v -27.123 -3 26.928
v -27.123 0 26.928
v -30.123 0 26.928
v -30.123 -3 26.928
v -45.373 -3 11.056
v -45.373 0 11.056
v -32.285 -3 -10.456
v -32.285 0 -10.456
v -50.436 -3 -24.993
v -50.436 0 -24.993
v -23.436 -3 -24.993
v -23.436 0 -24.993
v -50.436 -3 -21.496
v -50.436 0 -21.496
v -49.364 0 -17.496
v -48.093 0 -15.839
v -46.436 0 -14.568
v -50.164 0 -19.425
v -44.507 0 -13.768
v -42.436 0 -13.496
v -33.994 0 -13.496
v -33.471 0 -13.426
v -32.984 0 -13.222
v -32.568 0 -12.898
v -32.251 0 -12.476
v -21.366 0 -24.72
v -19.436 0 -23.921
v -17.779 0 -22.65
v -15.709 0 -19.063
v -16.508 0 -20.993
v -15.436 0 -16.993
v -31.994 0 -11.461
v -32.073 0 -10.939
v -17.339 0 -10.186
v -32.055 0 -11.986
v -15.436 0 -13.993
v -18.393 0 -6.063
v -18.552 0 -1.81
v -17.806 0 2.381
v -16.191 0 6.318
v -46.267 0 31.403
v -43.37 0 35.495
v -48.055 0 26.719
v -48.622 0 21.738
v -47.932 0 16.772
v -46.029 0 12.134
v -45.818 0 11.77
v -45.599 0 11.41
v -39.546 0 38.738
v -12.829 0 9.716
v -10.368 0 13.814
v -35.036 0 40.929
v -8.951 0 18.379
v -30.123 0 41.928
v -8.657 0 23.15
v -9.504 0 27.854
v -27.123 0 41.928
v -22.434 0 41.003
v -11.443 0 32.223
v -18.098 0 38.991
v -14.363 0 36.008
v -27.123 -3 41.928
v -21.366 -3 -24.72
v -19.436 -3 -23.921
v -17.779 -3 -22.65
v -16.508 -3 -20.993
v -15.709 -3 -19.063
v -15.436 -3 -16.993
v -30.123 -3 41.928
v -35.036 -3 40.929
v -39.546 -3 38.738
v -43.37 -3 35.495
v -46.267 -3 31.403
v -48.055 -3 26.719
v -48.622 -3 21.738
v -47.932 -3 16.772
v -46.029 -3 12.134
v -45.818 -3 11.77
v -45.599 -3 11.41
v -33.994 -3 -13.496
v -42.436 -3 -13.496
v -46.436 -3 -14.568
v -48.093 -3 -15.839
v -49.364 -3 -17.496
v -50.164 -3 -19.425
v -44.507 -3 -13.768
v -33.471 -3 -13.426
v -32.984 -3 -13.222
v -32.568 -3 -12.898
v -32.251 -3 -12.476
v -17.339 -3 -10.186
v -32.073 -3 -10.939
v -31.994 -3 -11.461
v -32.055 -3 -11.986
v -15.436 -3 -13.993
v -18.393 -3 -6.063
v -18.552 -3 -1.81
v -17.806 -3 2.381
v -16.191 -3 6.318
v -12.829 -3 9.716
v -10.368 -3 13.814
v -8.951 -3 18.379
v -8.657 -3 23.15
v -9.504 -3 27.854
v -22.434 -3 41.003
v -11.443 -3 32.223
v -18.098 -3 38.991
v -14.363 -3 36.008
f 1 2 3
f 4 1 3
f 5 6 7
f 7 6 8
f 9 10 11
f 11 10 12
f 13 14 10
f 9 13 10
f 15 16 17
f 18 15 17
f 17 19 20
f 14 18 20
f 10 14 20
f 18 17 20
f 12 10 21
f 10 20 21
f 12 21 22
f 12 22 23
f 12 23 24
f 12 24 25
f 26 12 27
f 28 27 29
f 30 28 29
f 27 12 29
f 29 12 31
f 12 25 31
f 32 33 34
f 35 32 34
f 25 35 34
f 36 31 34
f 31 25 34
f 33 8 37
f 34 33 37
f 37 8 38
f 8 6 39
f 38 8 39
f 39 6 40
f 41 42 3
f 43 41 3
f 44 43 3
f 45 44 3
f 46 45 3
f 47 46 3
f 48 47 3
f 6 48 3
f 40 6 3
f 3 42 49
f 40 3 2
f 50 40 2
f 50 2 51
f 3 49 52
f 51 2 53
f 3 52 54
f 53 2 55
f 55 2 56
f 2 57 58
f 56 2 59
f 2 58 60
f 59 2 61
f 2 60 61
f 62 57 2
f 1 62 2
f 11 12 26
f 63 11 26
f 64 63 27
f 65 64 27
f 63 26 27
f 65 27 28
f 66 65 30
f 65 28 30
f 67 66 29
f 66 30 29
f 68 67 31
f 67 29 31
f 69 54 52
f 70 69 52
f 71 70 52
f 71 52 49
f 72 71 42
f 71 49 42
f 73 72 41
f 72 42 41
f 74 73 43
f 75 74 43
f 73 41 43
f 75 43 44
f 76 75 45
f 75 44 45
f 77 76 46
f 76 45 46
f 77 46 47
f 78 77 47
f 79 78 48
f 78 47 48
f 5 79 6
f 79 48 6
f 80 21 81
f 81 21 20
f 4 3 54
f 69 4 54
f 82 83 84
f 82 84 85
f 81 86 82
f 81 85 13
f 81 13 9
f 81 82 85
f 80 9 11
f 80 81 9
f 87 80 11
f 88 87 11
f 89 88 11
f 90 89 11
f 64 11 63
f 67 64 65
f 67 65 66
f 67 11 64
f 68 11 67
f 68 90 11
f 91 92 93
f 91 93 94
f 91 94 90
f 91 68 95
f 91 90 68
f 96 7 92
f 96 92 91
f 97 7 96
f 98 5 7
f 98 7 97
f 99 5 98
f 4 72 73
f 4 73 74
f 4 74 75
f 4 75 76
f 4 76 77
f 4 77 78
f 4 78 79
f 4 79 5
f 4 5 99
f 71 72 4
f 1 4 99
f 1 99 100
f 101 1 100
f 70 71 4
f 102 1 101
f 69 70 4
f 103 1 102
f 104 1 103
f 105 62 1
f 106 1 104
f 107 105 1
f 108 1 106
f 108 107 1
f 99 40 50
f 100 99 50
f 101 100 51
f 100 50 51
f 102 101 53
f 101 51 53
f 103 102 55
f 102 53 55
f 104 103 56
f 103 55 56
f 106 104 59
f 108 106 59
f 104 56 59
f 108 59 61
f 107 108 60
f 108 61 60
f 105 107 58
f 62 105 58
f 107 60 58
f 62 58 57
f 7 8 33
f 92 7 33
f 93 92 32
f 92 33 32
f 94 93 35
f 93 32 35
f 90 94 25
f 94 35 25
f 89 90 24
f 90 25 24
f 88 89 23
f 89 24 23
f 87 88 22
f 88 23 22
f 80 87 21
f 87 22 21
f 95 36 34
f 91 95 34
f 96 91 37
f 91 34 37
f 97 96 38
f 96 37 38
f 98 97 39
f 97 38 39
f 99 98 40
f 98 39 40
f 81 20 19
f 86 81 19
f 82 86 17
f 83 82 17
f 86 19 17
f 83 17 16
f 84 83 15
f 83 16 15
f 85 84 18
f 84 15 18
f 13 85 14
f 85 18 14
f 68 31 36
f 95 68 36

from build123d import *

# Parameters (mm, degrees)
F1_DEPTH = 3


with BuildPart() as f1:
    # F0 (on Front) → F1 (new body)
    with BuildSketch(Plane.XZ):
        with BuildLine():
            Line((-30.123222, 26.928305), (-30.123222, 41.928305))
            ThreePointArc((-30.123222, 41.928305), (-46.266543, 31.403405), (-46.028907, 12.133639))
            Line((-46.028907, 12.133639), (-45.373068, 11.055652))
            Line((-45.373068, 11.055652), (-32.285383, -10.456249))
            ThreePointArc((-32.285383, -10.456249), (-32.250589, -12.475808), (-33.99401, -13.495765))
            Line((-33.99401, -13.495765), (-42.436163, -13.495765))
            ThreePointArc((-42.436163, -13.495765), (-48.093017, -15.838911), (-50.436163, -21.495765))
            Line((-50.436163, -21.495765), (-50.436163, -24.992765))
            Line((-50.436163, -24.992765), (-23.436163, -24.992765))
            ThreePointArc((-23.436163, -24.992765), (-17.779309, -22.649619), (-15.436163, -16.992765))
            Line((-15.436163, -16.992765), (-15.436163, -13.992765))
            ThreePointArc((-15.436163, -13.992765), (-18.585945, -3.940307), (-16.190902, 6.318192))
            ThreePointArc((-16.190902, 6.318192), (-9.503928, 27.854266), (-27.123222, 41.928305))
            Line((-27.123222, 41.928305), (-27.123222, 26.928305))
            Line((-27.123222, 26.928305), (-30.123222, 26.928305))
        make_face()
        with BuildLine():
            Line((-45.373068, 11.055652), (-46.028907, 12.133639))
            ThreePointArc((-46.028907, 12.133639), (-45.709491, 11.589472), (-45.373068, 11.055652))
        make_face()
    extrude(amount=F1_DEPTH)


solid = f1.part
